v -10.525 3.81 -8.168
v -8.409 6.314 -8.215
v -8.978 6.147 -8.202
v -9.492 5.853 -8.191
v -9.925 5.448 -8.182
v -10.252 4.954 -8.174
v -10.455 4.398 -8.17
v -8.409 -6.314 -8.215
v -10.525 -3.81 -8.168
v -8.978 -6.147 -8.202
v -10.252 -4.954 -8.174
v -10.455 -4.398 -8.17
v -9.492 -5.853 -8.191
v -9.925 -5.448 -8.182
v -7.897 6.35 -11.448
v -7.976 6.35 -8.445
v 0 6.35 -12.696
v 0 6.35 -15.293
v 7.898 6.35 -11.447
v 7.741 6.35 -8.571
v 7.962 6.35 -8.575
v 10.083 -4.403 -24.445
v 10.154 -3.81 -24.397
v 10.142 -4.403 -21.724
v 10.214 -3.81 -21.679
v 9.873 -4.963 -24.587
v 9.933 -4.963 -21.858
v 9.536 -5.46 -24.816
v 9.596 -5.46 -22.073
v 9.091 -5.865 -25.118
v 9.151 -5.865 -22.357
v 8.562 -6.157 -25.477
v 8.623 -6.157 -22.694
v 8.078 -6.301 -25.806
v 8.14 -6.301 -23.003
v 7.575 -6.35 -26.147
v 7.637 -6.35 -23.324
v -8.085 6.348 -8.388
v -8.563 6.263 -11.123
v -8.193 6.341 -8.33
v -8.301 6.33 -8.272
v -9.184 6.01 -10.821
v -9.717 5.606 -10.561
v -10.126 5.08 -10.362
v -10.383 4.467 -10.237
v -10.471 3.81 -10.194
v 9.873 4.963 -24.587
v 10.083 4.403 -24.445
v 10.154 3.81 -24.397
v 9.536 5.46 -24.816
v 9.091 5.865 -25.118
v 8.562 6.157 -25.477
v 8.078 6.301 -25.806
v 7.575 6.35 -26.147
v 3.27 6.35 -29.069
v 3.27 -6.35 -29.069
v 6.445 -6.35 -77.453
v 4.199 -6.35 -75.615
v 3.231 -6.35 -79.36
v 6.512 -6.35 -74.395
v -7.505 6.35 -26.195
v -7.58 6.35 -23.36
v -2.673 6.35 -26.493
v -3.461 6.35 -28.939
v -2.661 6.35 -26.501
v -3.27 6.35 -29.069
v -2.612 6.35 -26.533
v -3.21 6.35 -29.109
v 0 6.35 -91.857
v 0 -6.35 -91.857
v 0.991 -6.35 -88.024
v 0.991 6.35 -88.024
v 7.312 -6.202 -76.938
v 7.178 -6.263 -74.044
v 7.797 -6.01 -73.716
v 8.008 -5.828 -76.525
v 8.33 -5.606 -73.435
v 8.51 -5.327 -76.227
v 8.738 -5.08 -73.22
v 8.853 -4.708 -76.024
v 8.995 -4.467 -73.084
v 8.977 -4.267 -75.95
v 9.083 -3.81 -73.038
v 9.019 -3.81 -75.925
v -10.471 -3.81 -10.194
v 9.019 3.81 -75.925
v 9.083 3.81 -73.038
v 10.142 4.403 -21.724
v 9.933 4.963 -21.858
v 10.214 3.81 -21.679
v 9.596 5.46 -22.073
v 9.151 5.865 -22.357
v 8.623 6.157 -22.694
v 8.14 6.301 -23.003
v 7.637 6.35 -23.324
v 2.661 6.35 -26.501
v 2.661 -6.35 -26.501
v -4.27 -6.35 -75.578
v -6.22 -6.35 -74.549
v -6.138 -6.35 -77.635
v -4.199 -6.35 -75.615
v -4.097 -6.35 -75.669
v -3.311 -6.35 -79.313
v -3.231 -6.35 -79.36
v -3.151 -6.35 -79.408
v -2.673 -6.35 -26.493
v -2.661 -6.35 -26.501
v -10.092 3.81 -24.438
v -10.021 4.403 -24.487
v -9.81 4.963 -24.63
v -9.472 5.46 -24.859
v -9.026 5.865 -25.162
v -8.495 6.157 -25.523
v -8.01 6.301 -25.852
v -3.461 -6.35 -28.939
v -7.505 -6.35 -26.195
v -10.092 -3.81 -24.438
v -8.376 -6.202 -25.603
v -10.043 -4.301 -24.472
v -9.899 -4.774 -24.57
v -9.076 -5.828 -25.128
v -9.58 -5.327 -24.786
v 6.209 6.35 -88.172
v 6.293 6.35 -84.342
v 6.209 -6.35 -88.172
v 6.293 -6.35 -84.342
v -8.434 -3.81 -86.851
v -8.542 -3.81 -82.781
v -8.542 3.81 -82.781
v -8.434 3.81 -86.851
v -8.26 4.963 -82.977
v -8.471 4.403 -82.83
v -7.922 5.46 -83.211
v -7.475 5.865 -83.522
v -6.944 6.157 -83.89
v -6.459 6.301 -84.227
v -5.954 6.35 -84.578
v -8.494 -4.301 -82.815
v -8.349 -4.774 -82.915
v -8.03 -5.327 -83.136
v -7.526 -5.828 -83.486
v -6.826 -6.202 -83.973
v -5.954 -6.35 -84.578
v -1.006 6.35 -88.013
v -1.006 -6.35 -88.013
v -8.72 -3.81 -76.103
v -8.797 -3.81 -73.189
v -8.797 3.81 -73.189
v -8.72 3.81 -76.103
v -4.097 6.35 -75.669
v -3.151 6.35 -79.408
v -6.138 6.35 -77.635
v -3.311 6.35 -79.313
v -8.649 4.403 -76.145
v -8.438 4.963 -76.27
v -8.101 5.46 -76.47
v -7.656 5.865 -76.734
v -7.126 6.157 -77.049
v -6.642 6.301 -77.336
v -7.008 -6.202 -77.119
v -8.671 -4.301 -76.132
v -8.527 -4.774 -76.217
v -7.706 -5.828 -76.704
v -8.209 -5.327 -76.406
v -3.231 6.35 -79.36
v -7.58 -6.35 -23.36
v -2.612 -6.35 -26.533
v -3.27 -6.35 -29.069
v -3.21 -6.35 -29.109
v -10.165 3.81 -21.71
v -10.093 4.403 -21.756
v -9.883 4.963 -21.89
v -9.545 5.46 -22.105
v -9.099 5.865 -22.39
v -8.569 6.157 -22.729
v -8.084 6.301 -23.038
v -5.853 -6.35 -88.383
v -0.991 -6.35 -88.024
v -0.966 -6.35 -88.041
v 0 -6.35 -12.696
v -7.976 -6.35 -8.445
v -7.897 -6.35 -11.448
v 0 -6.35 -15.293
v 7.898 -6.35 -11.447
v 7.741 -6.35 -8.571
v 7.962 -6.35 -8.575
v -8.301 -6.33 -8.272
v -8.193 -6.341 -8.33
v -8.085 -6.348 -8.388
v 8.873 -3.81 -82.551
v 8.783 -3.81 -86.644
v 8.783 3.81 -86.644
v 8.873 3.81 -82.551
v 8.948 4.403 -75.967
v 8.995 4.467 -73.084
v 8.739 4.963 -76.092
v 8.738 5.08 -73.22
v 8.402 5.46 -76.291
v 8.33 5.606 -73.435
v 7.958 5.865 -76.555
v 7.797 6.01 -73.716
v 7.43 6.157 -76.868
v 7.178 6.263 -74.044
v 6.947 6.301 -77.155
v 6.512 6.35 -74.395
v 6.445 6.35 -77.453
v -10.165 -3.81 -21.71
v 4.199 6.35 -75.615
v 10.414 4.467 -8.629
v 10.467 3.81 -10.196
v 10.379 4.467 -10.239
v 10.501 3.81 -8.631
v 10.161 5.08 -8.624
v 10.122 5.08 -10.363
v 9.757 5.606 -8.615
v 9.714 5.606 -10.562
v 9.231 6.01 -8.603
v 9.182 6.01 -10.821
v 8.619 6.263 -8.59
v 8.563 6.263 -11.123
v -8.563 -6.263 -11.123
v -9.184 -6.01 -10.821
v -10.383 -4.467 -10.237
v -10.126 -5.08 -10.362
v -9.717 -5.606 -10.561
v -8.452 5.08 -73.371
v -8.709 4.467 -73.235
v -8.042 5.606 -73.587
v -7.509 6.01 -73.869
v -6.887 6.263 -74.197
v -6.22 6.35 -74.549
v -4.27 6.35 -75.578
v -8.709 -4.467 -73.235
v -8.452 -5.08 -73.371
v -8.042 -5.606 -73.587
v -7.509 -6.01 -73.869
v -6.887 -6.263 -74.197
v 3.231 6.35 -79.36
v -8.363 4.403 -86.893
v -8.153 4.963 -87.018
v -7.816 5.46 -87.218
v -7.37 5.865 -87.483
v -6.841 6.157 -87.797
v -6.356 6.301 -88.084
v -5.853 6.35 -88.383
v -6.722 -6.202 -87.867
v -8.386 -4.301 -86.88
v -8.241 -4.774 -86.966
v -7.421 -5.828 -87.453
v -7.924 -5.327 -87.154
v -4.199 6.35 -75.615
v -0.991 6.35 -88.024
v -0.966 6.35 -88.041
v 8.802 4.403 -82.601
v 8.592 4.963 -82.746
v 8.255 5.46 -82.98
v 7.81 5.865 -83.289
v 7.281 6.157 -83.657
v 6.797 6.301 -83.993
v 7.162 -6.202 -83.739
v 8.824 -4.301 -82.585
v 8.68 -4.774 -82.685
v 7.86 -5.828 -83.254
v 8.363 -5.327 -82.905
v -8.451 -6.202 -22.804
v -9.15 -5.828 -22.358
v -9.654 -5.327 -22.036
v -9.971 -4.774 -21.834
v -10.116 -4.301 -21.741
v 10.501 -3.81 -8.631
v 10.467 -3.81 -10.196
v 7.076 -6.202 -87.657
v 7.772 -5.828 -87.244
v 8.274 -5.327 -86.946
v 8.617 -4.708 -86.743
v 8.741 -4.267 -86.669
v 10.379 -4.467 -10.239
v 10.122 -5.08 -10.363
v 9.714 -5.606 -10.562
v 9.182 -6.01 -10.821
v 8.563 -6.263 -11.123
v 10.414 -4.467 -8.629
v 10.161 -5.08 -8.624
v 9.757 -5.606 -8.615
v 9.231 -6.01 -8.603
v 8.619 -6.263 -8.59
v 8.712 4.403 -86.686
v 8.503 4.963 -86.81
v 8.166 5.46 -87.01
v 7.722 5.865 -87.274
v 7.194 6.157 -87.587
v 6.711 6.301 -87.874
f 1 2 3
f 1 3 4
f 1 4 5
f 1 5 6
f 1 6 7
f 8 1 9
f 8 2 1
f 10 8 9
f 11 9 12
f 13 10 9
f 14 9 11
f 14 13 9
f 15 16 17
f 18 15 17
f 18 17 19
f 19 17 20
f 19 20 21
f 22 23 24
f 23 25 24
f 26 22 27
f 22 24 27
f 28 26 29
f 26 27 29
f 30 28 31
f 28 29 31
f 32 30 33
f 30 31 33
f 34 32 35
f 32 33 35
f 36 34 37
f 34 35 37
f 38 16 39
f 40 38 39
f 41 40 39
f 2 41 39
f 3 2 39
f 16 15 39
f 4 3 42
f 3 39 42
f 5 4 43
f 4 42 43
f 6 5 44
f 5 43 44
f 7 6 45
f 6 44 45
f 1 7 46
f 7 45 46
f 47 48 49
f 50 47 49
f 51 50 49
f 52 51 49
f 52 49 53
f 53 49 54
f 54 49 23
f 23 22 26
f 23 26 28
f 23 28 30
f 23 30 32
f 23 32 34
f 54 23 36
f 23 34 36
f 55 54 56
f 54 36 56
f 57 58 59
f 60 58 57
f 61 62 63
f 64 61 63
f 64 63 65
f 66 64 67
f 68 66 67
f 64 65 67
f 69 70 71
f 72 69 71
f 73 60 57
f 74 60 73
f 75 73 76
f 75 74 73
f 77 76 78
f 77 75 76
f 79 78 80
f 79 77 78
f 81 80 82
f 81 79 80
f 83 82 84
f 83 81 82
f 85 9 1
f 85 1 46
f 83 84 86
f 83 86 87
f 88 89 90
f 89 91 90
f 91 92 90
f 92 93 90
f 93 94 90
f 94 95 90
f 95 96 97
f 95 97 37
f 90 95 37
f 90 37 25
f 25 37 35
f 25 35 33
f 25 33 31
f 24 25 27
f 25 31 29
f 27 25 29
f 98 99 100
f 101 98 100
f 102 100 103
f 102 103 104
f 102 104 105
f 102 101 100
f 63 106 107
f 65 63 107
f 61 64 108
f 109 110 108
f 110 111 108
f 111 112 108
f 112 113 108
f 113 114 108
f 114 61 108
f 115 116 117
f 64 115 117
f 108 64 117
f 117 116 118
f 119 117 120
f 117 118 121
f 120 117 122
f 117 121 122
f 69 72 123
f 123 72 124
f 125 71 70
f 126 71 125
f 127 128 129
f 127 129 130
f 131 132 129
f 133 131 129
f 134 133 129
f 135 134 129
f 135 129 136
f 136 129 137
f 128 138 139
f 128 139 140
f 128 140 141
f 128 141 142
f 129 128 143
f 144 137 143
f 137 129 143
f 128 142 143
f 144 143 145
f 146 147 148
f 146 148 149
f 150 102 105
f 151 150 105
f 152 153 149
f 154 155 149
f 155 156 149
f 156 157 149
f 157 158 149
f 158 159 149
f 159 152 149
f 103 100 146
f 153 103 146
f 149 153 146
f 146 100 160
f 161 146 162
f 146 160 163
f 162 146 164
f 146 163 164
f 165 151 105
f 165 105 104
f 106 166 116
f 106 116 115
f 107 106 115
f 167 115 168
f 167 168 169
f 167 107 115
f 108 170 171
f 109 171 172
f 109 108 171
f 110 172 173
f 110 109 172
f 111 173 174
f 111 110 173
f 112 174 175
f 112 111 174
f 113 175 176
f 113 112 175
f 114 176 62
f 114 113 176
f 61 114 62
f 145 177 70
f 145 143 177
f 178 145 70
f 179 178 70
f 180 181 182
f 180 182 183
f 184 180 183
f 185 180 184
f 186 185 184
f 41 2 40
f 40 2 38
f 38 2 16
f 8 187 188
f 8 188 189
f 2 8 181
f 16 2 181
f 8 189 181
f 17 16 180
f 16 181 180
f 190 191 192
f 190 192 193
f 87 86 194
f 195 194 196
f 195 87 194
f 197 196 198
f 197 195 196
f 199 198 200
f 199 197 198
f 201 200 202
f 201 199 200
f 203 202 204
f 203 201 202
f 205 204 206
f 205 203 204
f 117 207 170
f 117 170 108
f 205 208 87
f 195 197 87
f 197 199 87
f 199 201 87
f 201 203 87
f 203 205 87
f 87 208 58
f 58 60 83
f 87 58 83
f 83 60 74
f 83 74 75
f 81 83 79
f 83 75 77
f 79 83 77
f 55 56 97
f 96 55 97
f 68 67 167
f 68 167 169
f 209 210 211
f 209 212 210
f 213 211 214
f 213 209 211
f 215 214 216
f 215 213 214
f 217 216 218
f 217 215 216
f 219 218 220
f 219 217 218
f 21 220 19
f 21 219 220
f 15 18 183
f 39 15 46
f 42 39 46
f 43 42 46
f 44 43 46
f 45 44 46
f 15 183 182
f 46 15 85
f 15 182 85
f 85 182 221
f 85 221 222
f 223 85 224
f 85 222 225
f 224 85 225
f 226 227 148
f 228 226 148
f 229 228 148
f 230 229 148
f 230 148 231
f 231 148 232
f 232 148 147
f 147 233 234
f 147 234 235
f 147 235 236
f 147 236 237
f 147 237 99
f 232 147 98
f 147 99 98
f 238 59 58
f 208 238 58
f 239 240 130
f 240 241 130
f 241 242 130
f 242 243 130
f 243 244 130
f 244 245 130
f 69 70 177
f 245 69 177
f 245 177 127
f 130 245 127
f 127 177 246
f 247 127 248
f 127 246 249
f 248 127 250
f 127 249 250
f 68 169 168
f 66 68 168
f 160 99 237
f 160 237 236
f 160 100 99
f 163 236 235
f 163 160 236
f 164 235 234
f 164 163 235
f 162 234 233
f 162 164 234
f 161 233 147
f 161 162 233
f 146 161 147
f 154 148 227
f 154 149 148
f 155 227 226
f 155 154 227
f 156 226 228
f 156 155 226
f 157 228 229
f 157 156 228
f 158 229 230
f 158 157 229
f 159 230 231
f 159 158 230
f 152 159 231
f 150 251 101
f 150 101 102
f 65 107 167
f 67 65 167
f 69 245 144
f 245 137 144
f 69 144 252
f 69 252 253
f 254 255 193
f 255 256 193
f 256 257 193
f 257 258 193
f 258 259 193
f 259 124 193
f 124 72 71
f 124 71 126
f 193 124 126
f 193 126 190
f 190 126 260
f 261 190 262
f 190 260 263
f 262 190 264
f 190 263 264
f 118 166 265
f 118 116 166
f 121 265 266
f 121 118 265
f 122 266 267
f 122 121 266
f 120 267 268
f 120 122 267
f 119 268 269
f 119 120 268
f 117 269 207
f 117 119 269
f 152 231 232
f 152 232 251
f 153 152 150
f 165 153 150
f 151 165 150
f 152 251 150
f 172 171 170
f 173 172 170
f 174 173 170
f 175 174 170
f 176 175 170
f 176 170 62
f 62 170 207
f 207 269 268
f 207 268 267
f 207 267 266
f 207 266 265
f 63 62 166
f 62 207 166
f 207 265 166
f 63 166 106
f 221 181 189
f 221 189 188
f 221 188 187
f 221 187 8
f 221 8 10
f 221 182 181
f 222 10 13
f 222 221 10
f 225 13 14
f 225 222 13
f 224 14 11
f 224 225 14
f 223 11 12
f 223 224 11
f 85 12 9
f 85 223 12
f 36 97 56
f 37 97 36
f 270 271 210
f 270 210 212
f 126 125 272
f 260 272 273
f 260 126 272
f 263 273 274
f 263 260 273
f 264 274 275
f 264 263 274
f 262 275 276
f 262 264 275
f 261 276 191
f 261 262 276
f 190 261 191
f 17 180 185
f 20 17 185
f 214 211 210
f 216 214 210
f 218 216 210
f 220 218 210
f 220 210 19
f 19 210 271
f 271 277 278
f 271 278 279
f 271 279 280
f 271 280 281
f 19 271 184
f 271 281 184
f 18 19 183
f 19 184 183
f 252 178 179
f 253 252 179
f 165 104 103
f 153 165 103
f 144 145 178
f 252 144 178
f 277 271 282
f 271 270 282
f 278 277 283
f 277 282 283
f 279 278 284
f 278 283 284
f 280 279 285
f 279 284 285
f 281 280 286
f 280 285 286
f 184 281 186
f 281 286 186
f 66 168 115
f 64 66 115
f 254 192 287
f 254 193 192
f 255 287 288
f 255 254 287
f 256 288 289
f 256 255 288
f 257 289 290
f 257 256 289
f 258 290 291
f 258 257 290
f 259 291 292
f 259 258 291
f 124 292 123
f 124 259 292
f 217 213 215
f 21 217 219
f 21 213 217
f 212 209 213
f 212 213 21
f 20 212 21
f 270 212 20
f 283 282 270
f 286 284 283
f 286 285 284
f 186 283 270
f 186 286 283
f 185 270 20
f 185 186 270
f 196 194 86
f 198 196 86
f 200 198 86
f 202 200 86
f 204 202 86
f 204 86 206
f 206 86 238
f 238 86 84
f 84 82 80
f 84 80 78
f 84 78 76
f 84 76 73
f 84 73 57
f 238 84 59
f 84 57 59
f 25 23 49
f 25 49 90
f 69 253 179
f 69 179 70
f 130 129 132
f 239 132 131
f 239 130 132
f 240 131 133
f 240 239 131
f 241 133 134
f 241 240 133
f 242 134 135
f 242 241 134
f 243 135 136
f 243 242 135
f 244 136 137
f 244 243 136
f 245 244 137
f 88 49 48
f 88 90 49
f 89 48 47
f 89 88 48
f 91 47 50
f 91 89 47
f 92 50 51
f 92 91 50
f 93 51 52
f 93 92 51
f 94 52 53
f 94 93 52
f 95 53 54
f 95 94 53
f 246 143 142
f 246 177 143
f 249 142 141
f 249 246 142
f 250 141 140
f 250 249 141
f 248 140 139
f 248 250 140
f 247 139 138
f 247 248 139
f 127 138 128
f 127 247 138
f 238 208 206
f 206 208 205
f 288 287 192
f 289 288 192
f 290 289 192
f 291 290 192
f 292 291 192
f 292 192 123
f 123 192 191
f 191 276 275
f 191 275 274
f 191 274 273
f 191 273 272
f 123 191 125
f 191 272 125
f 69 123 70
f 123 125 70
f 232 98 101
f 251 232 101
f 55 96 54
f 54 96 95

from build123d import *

# Parameters (mm, degrees)
F1_DEPTH = 6.35
F2_DEPTH = 6.35
F4_DEPTH = 25.4
F5_R     = 2.54


with BuildPart() as f1:
    # F0 (on Front) → F1 (new body)
    with BuildSketch(Plane.XZ):
        Polygon((10.5009634349, -8.6313571018), (0, -8.4001217037), (-10.5245159939, -8.168367669), (-8.3013391122, -91.856867075), (8.6683045514, -91.856867075), align=None)
    extrude(amount=F1_DEPTH)

    # F2 (add): a face of the model
    f2_faces = [f1.faces().sort_by_distance(p)[0] for p in [
        (0.0745348421, 0, -48.6438367355),
    ]]
    extrude(f2_faces, amount=F2_DEPTH)

    # F3 (on face) → F4 (cut)
    with BuildSketch(Plane.XZ.offset(6.35)):
        Polygon((-8.4089043082, -8.2149542811), (0, -12.6956291497), (7.741477061, -8.5705921125), align=None)
        Polygon((0, -15.2933746576), (-10.4707083295, -10.1938847244), (-10.1647846318, -21.7099702861), (-2.6734457948, -26.4930181658), (-2.660532576, -26.5012629595), (-2.6115273083, -26.532551698), align=None)
        Polygon((10.2136542458, -21.6787681594), (10.4665109394, -10.1959289555), (0, -15.2933746576), (2.660532576, -26.5012629595), align=None)
        Polygon((2.660532576, -26.5012629595), (0, -15.2933746576), (-2.6115273083, -26.532551698), (-3.2102312503, -29.1091816943), (-9.2748739024, -55.2094611118), (-4.0967862529, -75.6694136894), (-3.1505538377, -79.4082206875), (-0.965611629, -88.0414878319), (0, -91.856867075), (0.9910429813, -88.023830283), (3.2309755221, -79.3604887305), (4.199302435, -75.6153104147), (9.4752950296, -55.2094611118), (3.2699760565, -29.068634063), align=None)
        Polygon((-3.4606218927, -28.9392464633), (-10.0923027152, -24.4384544155), (-9.2748739024, -55.2094611118), (-3.2102312503, -29.1091816943), (-3.2699760565, -29.068634063), align=None)
        Polygon((9.4752950296, -55.2094611118), (10.15380398, -24.3967147102), (3.2699760565, -29.068634063), align=None)
        Polygon((-4.0967862529, -75.6694136894), (-9.2748739024, -55.2094611118), (-8.7972565245, -73.1887240187), (-4.2695118804, -75.5782571337), (-4.199302435, -75.6153104147), align=None)
        Polygon((9.0827017549, -73.0380792973), (9.4752950296, -55.2094611118), (4.199302435, -75.6153104147), align=None)
        Polygon((-0.965611629, -88.0414878319), (-3.1505538377, -79.4082206875), (-3.2309755221, -79.3604887305), (-3.3105833326, -79.3132398248), (-8.7198462703, -76.1027287805), (-8.5424459568, -82.7807246478), (-1.0061214638, -88.0133609601), (-0.9910429813, -88.023830283), align=None)
        Polygon((9.0191284413, -75.9250985328), (3.2309755221, -79.3604887305), (0.9910429813, -88.023830283), (8.8732221424, -82.5510594467), align=None)
        Polygon((-8.3013391122, -91.856867075), (0, -91.856867075), (-8.434321605, -86.8509202434), align=None)
        Polygon((8.7830958233, -86.6439154273), (0, -91.856867075), (8.6683045514, -91.856867075), align=None)
    extrude(amount=-F4_DEPTH, mode=Mode.SUBTRACT)

    # F5
    f5_edges = [f1.edges().sort_by_distance(p)[0] for p in [
        (-10.497612, -6.35, -9.181126),
        (-10.128544, -6.35, -23.074212),
        (-8.758551, -6.35, -74.645726),
        (-8.488384, -6.35, -84.815822),
        (-8.758551, 6.35, -74.645726),
        (-8.488384, 6.35, -84.815822),
        (9.050915, -6.35, -74.481589),
        (8.828159, -6.35, -84.597487),
        (-10.497612, 6.35, -9.181126),
        (-10.128544, 6.35, -23.074212),
        (10.183729, -6.35, -23.037741),
        (10.483737, -6.35, -9.413643),
        (10.483737, 6.35, -9.413643),
        (10.183729, 6.35, -23.037741),
        (8.828159, 6.35, -84.597487),
        (9.050915, 6.35, -74.481589),
    ]]
    fillet(f5_edges, radius=F5_R)


solid = f1.part
